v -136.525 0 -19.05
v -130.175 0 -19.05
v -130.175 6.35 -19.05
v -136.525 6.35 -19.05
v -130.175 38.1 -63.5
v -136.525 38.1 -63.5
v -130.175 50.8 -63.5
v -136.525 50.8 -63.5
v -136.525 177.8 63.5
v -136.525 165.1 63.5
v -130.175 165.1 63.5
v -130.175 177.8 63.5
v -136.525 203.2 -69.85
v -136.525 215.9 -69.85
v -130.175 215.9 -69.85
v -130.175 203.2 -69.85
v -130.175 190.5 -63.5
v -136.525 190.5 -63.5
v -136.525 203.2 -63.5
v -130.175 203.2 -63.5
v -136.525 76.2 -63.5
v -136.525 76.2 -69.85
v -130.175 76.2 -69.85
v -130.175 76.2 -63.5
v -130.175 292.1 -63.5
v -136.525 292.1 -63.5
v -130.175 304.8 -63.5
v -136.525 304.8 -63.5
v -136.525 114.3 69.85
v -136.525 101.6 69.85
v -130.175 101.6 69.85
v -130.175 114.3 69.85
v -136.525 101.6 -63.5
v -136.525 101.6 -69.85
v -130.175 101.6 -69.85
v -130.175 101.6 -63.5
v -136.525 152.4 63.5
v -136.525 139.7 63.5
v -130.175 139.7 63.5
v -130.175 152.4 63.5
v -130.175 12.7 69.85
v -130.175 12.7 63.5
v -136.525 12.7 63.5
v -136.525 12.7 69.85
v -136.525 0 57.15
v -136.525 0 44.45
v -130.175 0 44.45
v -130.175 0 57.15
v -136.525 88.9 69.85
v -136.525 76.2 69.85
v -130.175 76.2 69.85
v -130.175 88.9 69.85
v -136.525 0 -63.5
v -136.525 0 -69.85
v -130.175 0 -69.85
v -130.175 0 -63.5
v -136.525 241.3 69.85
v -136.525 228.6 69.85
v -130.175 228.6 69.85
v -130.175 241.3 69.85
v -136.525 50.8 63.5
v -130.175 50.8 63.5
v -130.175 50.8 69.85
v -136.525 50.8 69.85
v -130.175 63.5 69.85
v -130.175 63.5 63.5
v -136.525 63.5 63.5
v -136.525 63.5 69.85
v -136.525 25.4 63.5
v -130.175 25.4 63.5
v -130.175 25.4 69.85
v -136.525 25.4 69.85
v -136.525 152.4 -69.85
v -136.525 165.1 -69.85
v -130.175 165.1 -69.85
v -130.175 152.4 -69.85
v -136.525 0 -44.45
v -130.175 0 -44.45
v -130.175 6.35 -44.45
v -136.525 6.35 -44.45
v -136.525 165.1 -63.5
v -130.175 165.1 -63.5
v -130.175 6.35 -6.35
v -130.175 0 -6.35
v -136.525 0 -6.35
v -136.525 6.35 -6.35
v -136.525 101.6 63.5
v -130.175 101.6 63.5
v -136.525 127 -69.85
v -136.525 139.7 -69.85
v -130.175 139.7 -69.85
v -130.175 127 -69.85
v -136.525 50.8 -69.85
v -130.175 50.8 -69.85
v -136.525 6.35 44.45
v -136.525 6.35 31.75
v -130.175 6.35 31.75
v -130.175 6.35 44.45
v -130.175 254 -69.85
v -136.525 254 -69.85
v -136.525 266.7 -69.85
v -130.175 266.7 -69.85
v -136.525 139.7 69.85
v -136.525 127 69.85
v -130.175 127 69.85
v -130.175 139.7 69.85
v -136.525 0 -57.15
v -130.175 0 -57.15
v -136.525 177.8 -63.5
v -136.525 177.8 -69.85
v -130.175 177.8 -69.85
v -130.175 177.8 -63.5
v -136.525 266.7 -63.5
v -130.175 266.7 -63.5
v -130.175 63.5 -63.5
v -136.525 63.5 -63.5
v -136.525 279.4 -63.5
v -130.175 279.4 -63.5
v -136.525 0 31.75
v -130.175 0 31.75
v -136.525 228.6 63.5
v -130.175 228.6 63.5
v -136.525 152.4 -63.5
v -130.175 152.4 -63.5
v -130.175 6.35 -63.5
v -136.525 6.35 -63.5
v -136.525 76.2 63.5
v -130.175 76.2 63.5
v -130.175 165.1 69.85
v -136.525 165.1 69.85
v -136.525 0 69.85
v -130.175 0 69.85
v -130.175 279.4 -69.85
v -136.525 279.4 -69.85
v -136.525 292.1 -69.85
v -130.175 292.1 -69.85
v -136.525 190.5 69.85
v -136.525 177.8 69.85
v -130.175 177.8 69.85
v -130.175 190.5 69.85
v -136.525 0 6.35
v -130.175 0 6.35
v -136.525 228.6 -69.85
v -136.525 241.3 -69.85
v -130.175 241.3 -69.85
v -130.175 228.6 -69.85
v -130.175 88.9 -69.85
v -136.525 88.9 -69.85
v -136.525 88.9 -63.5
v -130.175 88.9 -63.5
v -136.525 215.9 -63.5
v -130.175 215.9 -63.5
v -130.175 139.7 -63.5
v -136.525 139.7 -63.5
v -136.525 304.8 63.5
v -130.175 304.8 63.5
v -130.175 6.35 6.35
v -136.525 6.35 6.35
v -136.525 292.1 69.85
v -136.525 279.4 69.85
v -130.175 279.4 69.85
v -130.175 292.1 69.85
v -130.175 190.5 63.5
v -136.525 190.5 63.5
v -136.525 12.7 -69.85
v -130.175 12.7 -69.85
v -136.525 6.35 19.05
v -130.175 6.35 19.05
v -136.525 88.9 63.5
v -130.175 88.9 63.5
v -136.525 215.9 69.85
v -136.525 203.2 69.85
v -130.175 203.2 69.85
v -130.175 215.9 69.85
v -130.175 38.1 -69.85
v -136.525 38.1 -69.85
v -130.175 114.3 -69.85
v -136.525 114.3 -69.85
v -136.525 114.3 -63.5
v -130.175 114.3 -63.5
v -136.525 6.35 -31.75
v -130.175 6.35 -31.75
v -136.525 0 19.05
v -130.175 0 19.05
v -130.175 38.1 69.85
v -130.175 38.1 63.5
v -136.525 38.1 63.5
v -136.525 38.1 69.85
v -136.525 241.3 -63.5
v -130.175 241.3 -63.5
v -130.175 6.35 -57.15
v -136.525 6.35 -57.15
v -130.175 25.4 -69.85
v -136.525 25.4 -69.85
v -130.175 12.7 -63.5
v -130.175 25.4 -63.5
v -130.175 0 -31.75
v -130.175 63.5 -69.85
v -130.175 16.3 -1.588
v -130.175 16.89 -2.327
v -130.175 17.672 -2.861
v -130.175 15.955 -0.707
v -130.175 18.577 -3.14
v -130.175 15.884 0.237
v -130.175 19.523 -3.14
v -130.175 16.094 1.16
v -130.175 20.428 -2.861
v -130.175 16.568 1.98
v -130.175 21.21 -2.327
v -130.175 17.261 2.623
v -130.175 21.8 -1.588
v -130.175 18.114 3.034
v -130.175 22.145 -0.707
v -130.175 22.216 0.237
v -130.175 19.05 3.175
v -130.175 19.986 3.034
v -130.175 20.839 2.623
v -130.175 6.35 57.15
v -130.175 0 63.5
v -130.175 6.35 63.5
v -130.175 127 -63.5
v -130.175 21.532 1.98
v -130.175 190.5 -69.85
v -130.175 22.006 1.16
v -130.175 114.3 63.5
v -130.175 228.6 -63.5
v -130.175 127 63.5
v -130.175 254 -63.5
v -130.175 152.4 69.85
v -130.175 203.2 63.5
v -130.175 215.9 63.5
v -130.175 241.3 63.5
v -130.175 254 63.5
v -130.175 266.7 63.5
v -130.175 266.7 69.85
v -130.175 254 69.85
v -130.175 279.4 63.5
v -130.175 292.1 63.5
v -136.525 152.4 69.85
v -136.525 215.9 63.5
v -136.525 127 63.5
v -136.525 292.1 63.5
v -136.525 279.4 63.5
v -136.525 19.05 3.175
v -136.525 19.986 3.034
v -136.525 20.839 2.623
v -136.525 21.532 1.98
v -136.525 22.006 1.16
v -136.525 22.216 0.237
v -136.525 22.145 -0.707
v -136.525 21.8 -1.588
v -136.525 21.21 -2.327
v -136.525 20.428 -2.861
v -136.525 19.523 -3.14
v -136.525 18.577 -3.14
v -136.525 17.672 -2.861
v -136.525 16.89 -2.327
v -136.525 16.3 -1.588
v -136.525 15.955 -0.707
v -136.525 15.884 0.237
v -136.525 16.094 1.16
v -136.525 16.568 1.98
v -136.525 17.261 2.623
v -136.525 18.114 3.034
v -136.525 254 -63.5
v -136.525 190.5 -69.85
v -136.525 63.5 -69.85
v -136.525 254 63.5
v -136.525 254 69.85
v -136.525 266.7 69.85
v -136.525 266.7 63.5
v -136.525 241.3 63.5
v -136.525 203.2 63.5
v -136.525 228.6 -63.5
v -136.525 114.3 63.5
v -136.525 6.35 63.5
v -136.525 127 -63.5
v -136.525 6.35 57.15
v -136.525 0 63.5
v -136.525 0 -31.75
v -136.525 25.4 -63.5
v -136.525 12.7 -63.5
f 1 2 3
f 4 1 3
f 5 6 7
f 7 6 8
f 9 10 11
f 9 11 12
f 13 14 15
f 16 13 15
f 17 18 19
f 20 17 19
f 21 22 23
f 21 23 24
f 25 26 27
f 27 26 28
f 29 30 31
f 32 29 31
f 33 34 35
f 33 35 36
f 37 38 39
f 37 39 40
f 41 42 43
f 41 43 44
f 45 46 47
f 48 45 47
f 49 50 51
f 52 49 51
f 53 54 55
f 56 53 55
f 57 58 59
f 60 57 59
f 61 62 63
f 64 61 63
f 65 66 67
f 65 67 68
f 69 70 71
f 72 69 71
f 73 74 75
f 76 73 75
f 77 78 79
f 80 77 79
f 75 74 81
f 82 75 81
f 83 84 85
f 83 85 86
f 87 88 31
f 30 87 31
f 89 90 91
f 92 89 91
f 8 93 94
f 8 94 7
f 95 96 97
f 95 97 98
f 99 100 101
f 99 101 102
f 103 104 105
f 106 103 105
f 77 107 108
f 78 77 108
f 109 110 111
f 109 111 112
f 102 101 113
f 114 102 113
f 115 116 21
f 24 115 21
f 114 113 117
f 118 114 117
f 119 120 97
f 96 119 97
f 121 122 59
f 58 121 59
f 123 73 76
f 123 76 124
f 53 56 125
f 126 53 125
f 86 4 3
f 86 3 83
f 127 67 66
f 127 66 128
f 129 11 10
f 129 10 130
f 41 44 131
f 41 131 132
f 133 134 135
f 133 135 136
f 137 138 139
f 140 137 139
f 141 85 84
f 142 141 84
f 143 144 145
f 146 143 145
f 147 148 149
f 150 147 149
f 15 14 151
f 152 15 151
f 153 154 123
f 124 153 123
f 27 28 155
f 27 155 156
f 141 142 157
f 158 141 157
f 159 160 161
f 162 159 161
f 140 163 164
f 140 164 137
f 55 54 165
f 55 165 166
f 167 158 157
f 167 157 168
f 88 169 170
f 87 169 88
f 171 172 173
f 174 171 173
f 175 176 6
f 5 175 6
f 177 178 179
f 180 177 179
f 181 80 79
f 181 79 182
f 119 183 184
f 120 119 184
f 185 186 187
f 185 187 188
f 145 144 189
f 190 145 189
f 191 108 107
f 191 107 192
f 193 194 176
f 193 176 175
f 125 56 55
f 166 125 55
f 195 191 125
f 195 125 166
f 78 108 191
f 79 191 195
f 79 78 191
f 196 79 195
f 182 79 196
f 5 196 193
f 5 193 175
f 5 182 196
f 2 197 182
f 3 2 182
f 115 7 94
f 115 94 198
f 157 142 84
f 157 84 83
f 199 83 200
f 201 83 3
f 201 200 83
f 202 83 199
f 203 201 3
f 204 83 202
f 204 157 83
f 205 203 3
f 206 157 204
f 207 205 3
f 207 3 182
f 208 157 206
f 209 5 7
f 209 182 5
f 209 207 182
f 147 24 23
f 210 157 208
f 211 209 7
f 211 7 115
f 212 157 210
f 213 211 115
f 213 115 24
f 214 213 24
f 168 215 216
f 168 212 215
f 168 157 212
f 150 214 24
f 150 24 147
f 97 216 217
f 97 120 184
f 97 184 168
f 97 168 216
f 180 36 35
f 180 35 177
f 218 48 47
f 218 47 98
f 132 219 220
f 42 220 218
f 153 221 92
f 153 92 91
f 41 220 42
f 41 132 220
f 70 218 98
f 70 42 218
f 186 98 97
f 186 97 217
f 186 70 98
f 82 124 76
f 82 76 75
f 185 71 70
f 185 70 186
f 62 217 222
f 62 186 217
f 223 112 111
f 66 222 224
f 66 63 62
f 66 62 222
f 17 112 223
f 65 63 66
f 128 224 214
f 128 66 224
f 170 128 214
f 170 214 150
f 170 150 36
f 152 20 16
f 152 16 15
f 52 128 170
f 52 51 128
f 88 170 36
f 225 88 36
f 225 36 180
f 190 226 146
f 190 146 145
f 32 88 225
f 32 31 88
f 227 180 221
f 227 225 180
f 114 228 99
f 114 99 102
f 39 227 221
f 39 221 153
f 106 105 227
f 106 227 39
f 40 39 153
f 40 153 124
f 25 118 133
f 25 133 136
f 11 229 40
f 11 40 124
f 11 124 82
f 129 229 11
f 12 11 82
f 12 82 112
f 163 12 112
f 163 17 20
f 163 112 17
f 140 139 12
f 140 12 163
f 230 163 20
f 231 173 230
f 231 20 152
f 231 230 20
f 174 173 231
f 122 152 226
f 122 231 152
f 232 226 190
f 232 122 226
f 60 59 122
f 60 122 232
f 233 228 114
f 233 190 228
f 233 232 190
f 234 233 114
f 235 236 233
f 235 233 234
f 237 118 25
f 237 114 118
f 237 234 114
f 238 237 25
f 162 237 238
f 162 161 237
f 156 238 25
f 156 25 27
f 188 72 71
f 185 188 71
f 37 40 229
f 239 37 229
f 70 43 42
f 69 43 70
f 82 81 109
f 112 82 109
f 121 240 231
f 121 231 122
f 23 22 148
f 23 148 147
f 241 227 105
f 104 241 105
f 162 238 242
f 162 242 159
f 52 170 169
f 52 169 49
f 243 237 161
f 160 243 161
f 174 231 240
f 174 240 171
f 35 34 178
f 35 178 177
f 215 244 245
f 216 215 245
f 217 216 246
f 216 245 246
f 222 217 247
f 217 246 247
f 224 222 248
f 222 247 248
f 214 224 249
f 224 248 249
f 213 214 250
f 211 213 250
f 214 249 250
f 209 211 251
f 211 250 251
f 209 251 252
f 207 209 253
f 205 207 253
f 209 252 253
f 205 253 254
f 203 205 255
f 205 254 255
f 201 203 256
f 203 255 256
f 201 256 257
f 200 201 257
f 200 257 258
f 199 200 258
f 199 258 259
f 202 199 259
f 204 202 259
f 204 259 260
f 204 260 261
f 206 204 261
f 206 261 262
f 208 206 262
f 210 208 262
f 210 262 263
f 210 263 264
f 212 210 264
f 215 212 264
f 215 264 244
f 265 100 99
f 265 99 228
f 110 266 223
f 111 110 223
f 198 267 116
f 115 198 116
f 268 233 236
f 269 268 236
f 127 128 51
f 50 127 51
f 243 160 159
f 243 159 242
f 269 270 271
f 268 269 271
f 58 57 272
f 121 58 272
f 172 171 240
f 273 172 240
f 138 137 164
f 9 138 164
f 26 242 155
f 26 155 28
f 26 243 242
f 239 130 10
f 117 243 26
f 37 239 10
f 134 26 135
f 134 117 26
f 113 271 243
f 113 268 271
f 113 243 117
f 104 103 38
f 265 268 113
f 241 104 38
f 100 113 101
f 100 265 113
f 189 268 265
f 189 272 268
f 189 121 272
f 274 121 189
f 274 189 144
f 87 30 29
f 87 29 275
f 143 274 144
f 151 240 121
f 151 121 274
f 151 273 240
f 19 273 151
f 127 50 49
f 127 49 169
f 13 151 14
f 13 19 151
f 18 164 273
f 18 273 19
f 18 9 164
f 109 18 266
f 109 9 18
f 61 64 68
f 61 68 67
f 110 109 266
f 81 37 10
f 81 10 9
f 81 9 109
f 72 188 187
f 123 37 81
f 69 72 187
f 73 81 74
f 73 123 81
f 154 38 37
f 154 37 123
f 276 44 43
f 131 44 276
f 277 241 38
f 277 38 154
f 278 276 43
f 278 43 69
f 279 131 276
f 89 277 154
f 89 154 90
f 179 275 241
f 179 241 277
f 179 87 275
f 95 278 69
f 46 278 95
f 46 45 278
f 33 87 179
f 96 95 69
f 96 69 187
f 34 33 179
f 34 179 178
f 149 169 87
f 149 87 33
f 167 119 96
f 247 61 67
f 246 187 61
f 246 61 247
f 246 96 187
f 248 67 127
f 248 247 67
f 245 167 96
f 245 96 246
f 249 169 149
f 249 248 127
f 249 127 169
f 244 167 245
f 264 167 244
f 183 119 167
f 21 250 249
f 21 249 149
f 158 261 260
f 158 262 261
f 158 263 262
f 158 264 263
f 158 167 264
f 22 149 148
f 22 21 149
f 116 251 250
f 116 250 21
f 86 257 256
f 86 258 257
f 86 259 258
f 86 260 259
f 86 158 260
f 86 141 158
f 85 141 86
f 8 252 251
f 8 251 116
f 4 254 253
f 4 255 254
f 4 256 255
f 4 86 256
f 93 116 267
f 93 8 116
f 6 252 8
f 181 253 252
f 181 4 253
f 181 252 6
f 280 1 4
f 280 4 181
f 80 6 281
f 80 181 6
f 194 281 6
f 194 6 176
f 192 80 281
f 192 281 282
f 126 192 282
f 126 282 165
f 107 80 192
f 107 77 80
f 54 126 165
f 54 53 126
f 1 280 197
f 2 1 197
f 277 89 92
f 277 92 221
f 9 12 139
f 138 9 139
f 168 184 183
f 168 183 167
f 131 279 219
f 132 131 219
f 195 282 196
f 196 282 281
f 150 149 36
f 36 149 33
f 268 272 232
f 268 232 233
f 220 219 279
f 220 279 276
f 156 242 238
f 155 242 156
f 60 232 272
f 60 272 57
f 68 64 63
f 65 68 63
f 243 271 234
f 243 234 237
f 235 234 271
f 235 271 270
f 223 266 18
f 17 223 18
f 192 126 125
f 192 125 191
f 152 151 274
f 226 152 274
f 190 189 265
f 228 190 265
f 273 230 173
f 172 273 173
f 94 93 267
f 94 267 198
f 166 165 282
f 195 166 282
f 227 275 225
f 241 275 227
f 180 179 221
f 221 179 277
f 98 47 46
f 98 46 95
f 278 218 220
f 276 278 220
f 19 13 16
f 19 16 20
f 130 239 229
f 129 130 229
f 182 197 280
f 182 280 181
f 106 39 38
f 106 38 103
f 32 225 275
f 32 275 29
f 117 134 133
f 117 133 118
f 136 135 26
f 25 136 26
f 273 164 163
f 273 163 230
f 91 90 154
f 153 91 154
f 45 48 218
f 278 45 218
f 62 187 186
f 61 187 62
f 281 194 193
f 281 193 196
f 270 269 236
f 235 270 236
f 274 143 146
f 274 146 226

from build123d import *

# Parameters (mm, degrees)
SKETCH1_W              = 273.05
SKETCH1_H              = 139.7
BOSS_EXTRUDE1_DEPTH    = 6.35
SKETCH2_W              = 273.05
SKETCH2_H              = 139.7
SKETCH2_W_2            = 260.35
SKETCH2_H_2            = 127
BOSS_EXTRUDE2_DEPTH    = 298.45
SKETCH3_W              = 6.35
SKETCH3_H              = 16.933333333
SKETCH3_H_2            = 16.933333334
DOOR_SLOT_DEPTH        = 12.7
DOOR_GUIDE_HOLES_REACH = 361.617
SKETCH4_W              = 6.35
SKETCH4_H              = 15.875
LEVER_HOLES_W          = 9.652
LEVER_HOLES_H          = 6.35
LEVER_HOLES_W_2        = 6.35
CUT_EXTRUDE1_DEPTH     = 363.019620497
CUT_EXTRUDE2_REACH     = 417.137
SKETCH7_R              = 26.9875
CUT_EXTRUDE3_REACH     = 417.137
SKETCH8_R              = 3.175
SKETCH16_W             = 336.131526087
SKETCH16_H             = 315.233565403
CUT_EXTRUDE10_DEPTH    = 363.019620497
LEFT_RIGHT_W           = 6.35
LEFT_RIGHT_H           = 6.35
LEFT_RIGHT_W_2         = 12.7
LEFT_RIGHT_H_2         = 12.7
CUT_EXTRUDE11_DEPTH    = 313.765703043


with BuildPart() as part:
    # Sketch1 → Boss-Extrude1 (new body)
    with BuildSketch(Plane(origin=(0, 0, 0), x_dir=(1, 0, 0), z_dir=(0, 1, 0))):
        Rectangle(SKETCH1_W, SKETCH1_H)
    extrude(amount=BOSS_EXTRUDE1_DEPTH)

    # Sketch2 → Boss-Extrude2 (add)
    with BuildSketch(Plane(origin=(0, 6.35, 0), x_dir=(1, 0, 0), z_dir=(0, 1, 0))):
        Rectangle(SKETCH2_W, SKETCH2_H)
        Rectangle(SKETCH2_W_2, SKETCH2_H_2, mode=Mode.SUBTRACT)
    extrude(amount=BOSS_EXTRUDE2_DEPTH)

    # Sketch3 → Door Slot (cut)
    with BuildSketch(Plane.XY.offset(69.85)):
        with BuildLine():
            Line((-28.575, 283.21), (-28.575, 6.35))
            Line((-28.575, 6.35), (-21.971, 6.35))
            Line((-21.971, 6.35), (-21.971, 292.354))
            Line((-21.971, 292.354), (-41.529, 292.354))
            Line((-41.529, 292.354), (-41.529, 285.75))
            Line((-41.529, 285.75), (-31.115, 285.75))
            ThreePointArc((-31.115, 285.75), (-29.318948776, 285.006051224), (-28.575, 283.21))
        make_face()
        with Locations((-12.446, 80.433333334)):
            Rectangle(SKETCH3_W, SKETCH3_H)
        with Locations((-12.446, 50.8)):
            Rectangle(SKETCH3_W, SKETCH3_H_2)
        with Locations((-12.446, 21.166666667)):
            Rectangle(SKETCH3_W, SKETCH3_H)
    extrude(amount=-DOOR_SLOT_DEPTH, mode=Mode.SUBTRACT)

    # Sketch4 → Door Guide Holes (cut, up to next)
    with BuildSketch(Plane.XY.offset(-63.5), mode=Mode.PRIVATE) as door_guide_holes_sk1:
        with Locations((-44.704, 284.1625)):
            Rectangle(SKETCH4_W, SKETCH4_H)
    door_guide_holes_tool1 = extrude(door_guide_holes_sk1.sketch, amount=-DOOR_GUIDE_HOLES_REACH, mode=Mode.PRIVATE) & part.part
    # Sketch4 → Door Guide Holes (cut, up to next)
    with BuildSketch(Plane.XY.offset(-63.5), mode=Mode.PRIVATE) as door_guide_holes_sk2:
        with Locations((-44.704, 255.5875)):
            Rectangle(SKETCH4_W, SKETCH4_H)
    door_guide_holes_tool2 = extrude(door_guide_holes_sk2.sketch, amount=-DOOR_GUIDE_HOLES_REACH, mode=Mode.PRIVATE) & part.part
    # Sketch4 → Door Guide Holes (cut, up to next)
    with BuildSketch(Plane.XY.offset(-63.5), mode=Mode.PRIVATE) as door_guide_holes_sk3:
        with Locations((-44.704, 227.0125)):
            Rectangle(SKETCH4_W, SKETCH4_H)
    door_guide_holes_tool3 = extrude(door_guide_holes_sk3.sketch, amount=-DOOR_GUIDE_HOLES_REACH, mode=Mode.PRIVATE) & part.part
    # Sketch4 → Door Guide Holes (cut, up to next)
    with BuildSketch(Plane.XY.offset(-63.5), mode=Mode.PRIVATE) as door_guide_holes_sk4:
        with Locations((-44.704, 198.4375)):
            Rectangle(SKETCH4_W, SKETCH4_H)
    door_guide_holes_tool4 = extrude(door_guide_holes_sk4.sketch, amount=-DOOR_GUIDE_HOLES_REACH, mode=Mode.PRIVATE) & part.part
    # Sketch4 → Door Guide Holes (cut, up to next)
    with BuildSketch(Plane.XY.offset(-63.5), mode=Mode.PRIVATE) as door_guide_holes_sk5:
        with Locations((-44.704, 169.8625)):
            Rectangle(SKETCH4_W, SKETCH4_H)
    door_guide_holes_tool5 = extrude(door_guide_holes_sk5.sketch, amount=-DOOR_GUIDE_HOLES_REACH, mode=Mode.PRIVATE) & part.part
    # Sketch4 → Door Guide Holes (cut, up to next)
    with BuildSketch(Plane.XY.offset(-63.5), mode=Mode.PRIVATE) as door_guide_holes_sk6:
        with Locations((-44.704, 141.2875)):
            Rectangle(SKETCH4_W, SKETCH4_H)
    door_guide_holes_tool6 = extrude(door_guide_holes_sk6.sketch, amount=-DOOR_GUIDE_HOLES_REACH, mode=Mode.PRIVATE) & part.part
    # Sketch4 → Door Guide Holes (cut, up to next)
    with BuildSketch(Plane.XY.offset(-63.5), mode=Mode.PRIVATE) as door_guide_holes_sk7:
        with Locations((-44.704, 112.7125)):
            Rectangle(SKETCH4_W, SKETCH4_H)
    door_guide_holes_tool7 = extrude(door_guide_holes_sk7.sketch, amount=-DOOR_GUIDE_HOLES_REACH, mode=Mode.PRIVATE) & part.part
    # Sketch4 → Door Guide Holes (cut, up to next)
    with BuildSketch(Plane.XY.offset(-63.5), mode=Mode.PRIVATE) as door_guide_holes_sk8:
        with Locations((-44.704, 84.1375)):
            Rectangle(SKETCH4_W, SKETCH4_H)
    door_guide_holes_tool8 = extrude(door_guide_holes_sk8.sketch, amount=-DOOR_GUIDE_HOLES_REACH, mode=Mode.PRIVATE) & part.part
    # Sketch4 → Door Guide Holes (cut, up to next)
    with BuildSketch(Plane.XY.offset(-63.5), mode=Mode.PRIVATE) as door_guide_holes_sk9:
        with Locations((-44.704, 55.5625)):
            Rectangle(SKETCH4_W, SKETCH4_H)
    door_guide_holes_tool9 = extrude(door_guide_holes_sk9.sketch, amount=-DOOR_GUIDE_HOLES_REACH, mode=Mode.PRIVATE) & part.part
    # Sketch4 → Door Guide Holes (cut, up to next)
    with BuildSketch(Plane.XY.offset(-63.5), mode=Mode.PRIVATE) as door_guide_holes_sk10:
        with Locations((-44.704, 26.9875)):
            Rectangle(SKETCH4_W, SKETCH4_H)
    door_guide_holes_tool10 = extrude(door_guide_holes_sk10.sketch, amount=-DOOR_GUIDE_HOLES_REACH, mode=Mode.PRIVATE) & part.part
    door_guide_holes_1 = door_guide_holes_tool1.solids().sort_by_distance((-44.704, 284.1625, -63.5))[0]
    add(door_guide_holes_1, mode=Mode.SUBTRACT)
    door_guide_holes_2 = door_guide_holes_tool2.solids().sort_by_distance((-44.704, 255.5875, -63.5))[0]
    add(door_guide_holes_2, mode=Mode.SUBTRACT)
    door_guide_holes_3 = door_guide_holes_tool3.solids().sort_by_distance((-44.704, 227.0125, -63.5))[0]
    add(door_guide_holes_3, mode=Mode.SUBTRACT)
    door_guide_holes_4 = door_guide_holes_tool4.solids().sort_by_distance((-44.704, 198.4375, -63.5))[0]
    add(door_guide_holes_4, mode=Mode.SUBTRACT)
    door_guide_holes_5 = door_guide_holes_tool5.solids().sort_by_distance((-44.704, 169.8625, -63.5))[0]
    add(door_guide_holes_5, mode=Mode.SUBTRACT)
    door_guide_holes_6 = door_guide_holes_tool6.solids().sort_by_distance((-44.704, 141.2875, -63.5))[0]
    add(door_guide_holes_6, mode=Mode.SUBTRACT)
    door_guide_holes_7 = door_guide_holes_tool7.solids().sort_by_distance((-44.704, 112.7125, -63.5))[0]
    add(door_guide_holes_7, mode=Mode.SUBTRACT)
    door_guide_holes_8 = door_guide_holes_tool8.solids().sort_by_distance((-44.704, 84.1375, -63.5))[0]
    add(door_guide_holes_8, mode=Mode.SUBTRACT)
    door_guide_holes_9 = door_guide_holes_tool9.solids().sort_by_distance((-44.704, 55.5625, -63.5))[0]
    add(door_guide_holes_9, mode=Mode.SUBTRACT)
    door_guide_holes_10 = door_guide_holes_tool10.solids().sort_by_distance((-44.704, 26.9875, -63.5))[0]
    add(door_guide_holes_10, mode=Mode.SUBTRACT)
    door_guide_holes = door_guide_holes_1 + door_guide_holes_2 + door_guide_holes_3 + door_guide_holes_4 + door_guide_holes_5 + door_guide_holes_6 + door_guide_holes_7 + door_guide_holes_8 + door_guide_holes_9 + door_guide_holes_10  # Door Guide Holes as one shape, for the pattern or mirror that repeats it

    # Mirror1: Door Guide Holes across plane
    add(door_guide_holes.mirror(Plane.ZY.offset(31.75)), mode=Mode.SUBTRACT)

    # Lever Holes → Cut-Extrude1 (cut, through all)
    with BuildSketch(Plane.XY.offset(69.85)):
        with Locations((54.102, 28.575)):
            Rectangle(LEVER_HOLES_W, LEVER_HOLES_H)
        with Locations((39.3065, 15.875)):
            Rectangle(LEVER_HOLES_W_2, LEVER_HOLES_H)
        with Locations((68.8975, 15.875)):
            Rectangle(LEVER_HOLES_W_2, LEVER_HOLES_H)
    extrude(amount=-CUT_EXTRUDE1_DEPTH, mode=Mode.SUBTRACT)

    # Sketch7 → Cut-Extrude2 (cut, up to next)
    with BuildSketch(Plane(origin=(136.525, 0, 0), x_dir=(0, 0, -1), z_dir=(1, 0, 0)), mode=Mode.PRIVATE) as cut_extrude2_sk1:
        with Locations((0, 55.372)):
            Circle(SKETCH7_R)
    cut_extrude2_tool1 = extrude(cut_extrude2_sk1.sketch, amount=-CUT_EXTRUDE2_REACH, mode=Mode.PRIVATE) & part.part
    # Sketch7 → Cut-Extrude2 (cut, up to next)
    with BuildSketch(Plane(origin=(136.525, 0, 0), x_dir=(0, 0, -1), z_dir=(1, 0, 0)), mode=Mode.PRIVATE) as cut_extrude2_sk2:
        with BuildLine():
            Line((-37.211, 89.408), (-37.211, 92.583))
            Line((-37.211, 92.583), (-34.036, 92.583))
            ThreePointArc((-34.036, 92.583), (-39.45606403, 94.82806403), (-37.211, 89.408))
        make_face()
    cut_extrude2_tool2 = extrude(cut_extrude2_sk2.sketch, amount=-CUT_EXTRUDE2_REACH, mode=Mode.PRIVATE) & part.part
    # Sketch7 → Cut-Extrude2 (cut, up to next)
    with BuildSketch(Plane(origin=(136.525, 0, 0), x_dir=(0, 0, -1), z_dir=(1, 0, 0)), mode=Mode.PRIVATE) as cut_extrude2_sk3:
        with BuildLine():
            Line((-34.036, 92.583), (-37.211, 92.583))
            Line((-37.211, 92.583), (-37.211, 89.408))
            ThreePointArc((-37.211, 89.408), (-34.96593597, 90.33793597), (-34.036, 92.583))
        make_face()
    cut_extrude2_tool3 = extrude(cut_extrude2_sk3.sketch, amount=-CUT_EXTRUDE2_REACH, mode=Mode.PRIVATE) & part.part
    # Sketch7 → Cut-Extrude2 (cut, up to next)
    with BuildSketch(Plane(origin=(136.525, 0, 0), x_dir=(0, 0, -1), z_dir=(1, 0, 0)), mode=Mode.PRIVATE) as cut_extrude2_sk4:
        with BuildLine():
            Line((-37.211, 89.408), (-37.211, 92.583))
            Line((-37.211, 92.583), (-34.036, 92.583))
            ThreePointArc((-34.036, 92.583), (-39.45606403, 94.82806403), (-37.211, 89.408))
        make_face()
    cut_extrude2_tool4 = extrude(cut_extrude2_sk4.sketch, amount=-CUT_EXTRUDE2_REACH, mode=Mode.PRIVATE) & part.part
    # Sketch7 → Cut-Extrude2 (cut, up to next)
    with BuildSketch(Plane(origin=(136.525, 0, 0), x_dir=(0, 0, -1), z_dir=(1, 0, 0)), mode=Mode.PRIVATE) as cut_extrude2_sk5:
        with BuildLine():
            Line((-34.036, 92.583), (-37.211, 92.583))
            Line((-37.211, 92.583), (-37.211, 89.408))
            ThreePointArc((-37.211, 89.408), (-34.96593597, 90.33793597), (-34.036, 92.583))
        make_face()
    cut_extrude2_tool5 = extrude(cut_extrude2_sk5.sketch, amount=-CUT_EXTRUDE2_REACH, mode=Mode.PRIVATE) & part.part
    # Sketch7 → Cut-Extrude2 (cut, up to next)
    with BuildSketch(Plane(origin=(136.525, 0, 0), x_dir=(0, 0, -1), z_dir=(1, 0, 0)), mode=Mode.PRIVATE) as cut_extrude2_sk6:
        with BuildLine():
            ThreePointArc((40.386, 92.583), (37.211, 95.758), (34.036, 92.583))
            Line((34.036, 92.583), (37.211, 92.583))
            Line((37.211, 92.583), (37.211, 89.408))
            ThreePointArc((37.211, 89.408), (39.45606403, 90.33793597), (40.386, 92.583))
        make_face()
    cut_extrude2_tool6 = extrude(cut_extrude2_sk6.sketch, amount=-CUT_EXTRUDE2_REACH, mode=Mode.PRIVATE) & part.part
    # Sketch7 → Cut-Extrude2 (cut, up to next)
    with BuildSketch(Plane(origin=(136.525, 0, 0), x_dir=(0, 0, -1), z_dir=(1, 0, 0)), mode=Mode.PRIVATE) as cut_extrude2_sk7:
        with BuildLine():
            Line((37.211, 92.583), (34.036, 92.583))
            ThreePointArc((34.036, 92.583), (34.96593597, 90.33793597), (37.211, 89.408))
            Line((37.211, 89.408), (37.211, 92.583))
        make_face()
    cut_extrude2_tool7 = extrude(cut_extrude2_sk7.sketch, amount=-CUT_EXTRUDE2_REACH, mode=Mode.PRIVATE) & part.part
    # Sketch7 → Cut-Extrude2 (cut, up to next)
    with BuildSketch(Plane(origin=(136.525, 0, 0), x_dir=(0, 0, -1), z_dir=(1, 0, 0)), mode=Mode.PRIVATE) as cut_extrude2_sk8:
        with BuildLine():
            ThreePointArc((40.386, 92.583), (37.211, 95.758), (34.036, 92.583))
            Line((34.036, 92.583), (37.211, 92.583))
            Line((37.211, 92.583), (37.211, 89.408))
            ThreePointArc((37.211, 89.408), (39.45606403, 90.33793597), (40.386, 92.583))
        make_face()
    cut_extrude2_tool8 = extrude(cut_extrude2_sk8.sketch, amount=-CUT_EXTRUDE2_REACH, mode=Mode.PRIVATE) & part.part
    # Sketch7 → Cut-Extrude2 (cut, up to next)
    with BuildSketch(Plane(origin=(136.525, 0, 0), x_dir=(0, 0, -1), z_dir=(1, 0, 0)), mode=Mode.PRIVATE) as cut_extrude2_sk9:
        with BuildLine():
            Line((37.211, 92.583), (34.036, 92.583))
            ThreePointArc((34.036, 92.583), (34.96593597, 90.33793597), (37.211, 89.408))
            Line((37.211, 89.408), (37.211, 92.583))
        make_face()
    cut_extrude2_tool9 = extrude(cut_extrude2_sk9.sketch, amount=-CUT_EXTRUDE2_REACH, mode=Mode.PRIVATE) & part.part
    # Sketch7 → Cut-Extrude2 (cut, up to next)
    with BuildSketch(Plane(origin=(136.525, 0, 0), x_dir=(0, 0, -1), z_dir=(1, 0, 0)), mode=Mode.PRIVATE) as cut_extrude2_sk10:
        with BuildLine():
            ThreePointArc((-34.036, 18.161), (-34.96593597, 20.40606403), (-37.211, 21.336))
            Line((-37.211, 21.336), (-37.211, 18.161))
            Line((-37.211, 18.161), (-34.036, 18.161))
        make_face()
    cut_extrude2_tool10 = extrude(cut_extrude2_sk10.sketch, amount=-CUT_EXTRUDE2_REACH, mode=Mode.PRIVATE) & part.part
    # Sketch7 → Cut-Extrude2 (cut, up to next)
    with BuildSketch(Plane(origin=(136.525, 0, 0), x_dir=(0, 0, -1), z_dir=(1, 0, 0)), mode=Mode.PRIVATE) as cut_extrude2_sk11:
        with BuildLine():
            Line((-37.211, 18.161), (-37.211, 21.336))
            ThreePointArc((-37.211, 21.336), (-39.45606403, 15.91593597), (-34.036, 18.161))
            Line((-34.036, 18.161), (-37.211, 18.161))
        make_face()
    cut_extrude2_tool11 = extrude(cut_extrude2_sk11.sketch, amount=-CUT_EXTRUDE2_REACH, mode=Mode.PRIVATE) & part.part
    # Sketch7 → Cut-Extrude2 (cut, up to next)
    with BuildSketch(Plane(origin=(136.525, 0, 0), x_dir=(0, 0, -1), z_dir=(1, 0, 0)), mode=Mode.PRIVATE) as cut_extrude2_sk12:
        with BuildLine():
            ThreePointArc((-34.036, 18.161), (-34.96593597, 20.40606403), (-37.211, 21.336))
            Line((-37.211, 21.336), (-37.211, 18.161))
            Line((-37.211, 18.161), (-34.036, 18.161))
        make_face()
    cut_extrude2_tool12 = extrude(cut_extrude2_sk12.sketch, amount=-CUT_EXTRUDE2_REACH, mode=Mode.PRIVATE) & part.part
    # Sketch7 → Cut-Extrude2 (cut, up to next)
    with BuildSketch(Plane(origin=(136.525, 0, 0), x_dir=(0, 0, -1), z_dir=(1, 0, 0)), mode=Mode.PRIVATE) as cut_extrude2_sk13:
        with BuildLine():
            Line((-37.211, 18.161), (-37.211, 21.336))
            ThreePointArc((-37.211, 21.336), (-39.45606403, 15.91593597), (-34.036, 18.161))
            Line((-34.036, 18.161), (-37.211, 18.161))
        make_face()
    cut_extrude2_tool13 = extrude(cut_extrude2_sk13.sketch, amount=-CUT_EXTRUDE2_REACH, mode=Mode.PRIVATE) & part.part
    # Sketch7 → Cut-Extrude2 (cut, up to next)
    with BuildSketch(Plane(origin=(136.525, 0, 0), x_dir=(0, 0, -1), z_dir=(1, 0, 0)), mode=Mode.PRIVATE) as cut_extrude2_sk14:
        with BuildLine():
            ThreePointArc((40.386, 18.161), (39.45606403, 20.40606403), (37.211, 21.336))
            Line((37.211, 21.336), (37.211, 18.161))
            Line((37.211, 18.161), (34.036, 18.161))
            ThreePointArc((34.036, 18.161), (37.211, 14.986), (40.386, 18.161))
        make_face()
    cut_extrude2_tool14 = extrude(cut_extrude2_sk14.sketch, amount=-CUT_EXTRUDE2_REACH, mode=Mode.PRIVATE) & part.part
    # Sketch7 → Cut-Extrude2 (cut, up to next)
    with BuildSketch(Plane(origin=(136.525, 0, 0), x_dir=(0, 0, -1), z_dir=(1, 0, 0)), mode=Mode.PRIVATE) as cut_extrude2_sk15:
        with BuildLine():
            Line((37.211, 18.161), (37.211, 21.336))
            ThreePointArc((37.211, 21.336), (34.96593597, 20.40606403), (34.036, 18.161))
            Line((34.036, 18.161), (37.211, 18.161))
        make_face()
    cut_extrude2_tool15 = extrude(cut_extrude2_sk15.sketch, amount=-CUT_EXTRUDE2_REACH, mode=Mode.PRIVATE) & part.part
    # Sketch7 → Cut-Extrude2 (cut, up to next)
    with BuildSketch(Plane(origin=(136.525, 0, 0), x_dir=(0, 0, -1), z_dir=(1, 0, 0)), mode=Mode.PRIVATE) as cut_extrude2_sk16:
        with BuildLine():
            ThreePointArc((40.386, 18.161), (39.45606403, 20.40606403), (37.211, 21.336))
            Line((37.211, 21.336), (37.211, 18.161))
            Line((37.211, 18.161), (34.036, 18.161))
            ThreePointArc((34.036, 18.161), (37.211, 14.986), (40.386, 18.161))
        make_face()
    cut_extrude2_tool16 = extrude(cut_extrude2_sk16.sketch, amount=-CUT_EXTRUDE2_REACH, mode=Mode.PRIVATE) & part.part
    # Sketch7 → Cut-Extrude2 (cut, up to next)
    with BuildSketch(Plane(origin=(136.525, 0, 0), x_dir=(0, 0, -1), z_dir=(1, 0, 0)), mode=Mode.PRIVATE) as cut_extrude2_sk17:
        with BuildLine():
            Line((37.211, 18.161), (37.211, 21.336))
            ThreePointArc((37.211, 21.336), (34.96593597, 20.40606403), (34.036, 18.161))
            Line((34.036, 18.161), (37.211, 18.161))
        make_face()
    cut_extrude2_tool17 = extrude(cut_extrude2_sk17.sketch, amount=-CUT_EXTRUDE2_REACH, mode=Mode.PRIVATE) & part.part
    add(cut_extrude2_tool1.solids().sort_by_distance((136.525, 55.372, 0))[0], mode=Mode.SUBTRACT)
    add(cut_extrude2_tool2.solids().sort_by_distance((136.525, 93.032171, 37.660171))[0], mode=Mode.SUBTRACT)
    add(cut_extrude2_tool3.solids().sort_by_distance((136.525, 91.235488, 35.863488))[0], mode=Mode.SUBTRACT)
    add(cut_extrude2_tool4.solids().sort_by_distance((136.525, 93.032171, 37.660171))[0], mode=Mode.SUBTRACT)
    add(cut_extrude2_tool5.solids().sort_by_distance((136.525, 91.235488, 35.863488))[0], mode=Mode.SUBTRACT)
    add(cut_extrude2_tool6.solids().sort_by_distance((136.525, 93.032171, -37.660171))[0], mode=Mode.SUBTRACT)
    add(cut_extrude2_tool7.solids().sort_by_distance((136.525, 91.235488, -35.863488))[0], mode=Mode.SUBTRACT)
    add(cut_extrude2_tool8.solids().sort_by_distance((136.525, 93.032171, -37.660171))[0], mode=Mode.SUBTRACT)
    add(cut_extrude2_tool9.solids().sort_by_distance((136.525, 91.235488, -35.863488))[0], mode=Mode.SUBTRACT)
    add(cut_extrude2_tool10.solids().sort_by_distance((136.525, 19.508512, 35.863488))[0], mode=Mode.SUBTRACT)
    add(cut_extrude2_tool11.solids().sort_by_distance((136.525, 17.711829, 37.660171))[0], mode=Mode.SUBTRACT)
    add(cut_extrude2_tool12.solids().sort_by_distance((136.525, 19.508512, 35.863488))[0], mode=Mode.SUBTRACT)
    add(cut_extrude2_tool13.solids().sort_by_distance((136.525, 17.711829, 37.660171))[0], mode=Mode.SUBTRACT)
    add(cut_extrude2_tool14.solids().sort_by_distance((136.525, 17.711829, -37.660171))[0], mode=Mode.SUBTRACT)
    add(cut_extrude2_tool15.solids().sort_by_distance((136.525, 19.508512, -35.863488))[0], mode=Mode.SUBTRACT)
    add(cut_extrude2_tool16.solids().sort_by_distance((136.525, 17.711829, -37.660171))[0], mode=Mode.SUBTRACT)
    add(cut_extrude2_tool17.solids().sort_by_distance((136.525, 19.508512, -35.863488))[0], mode=Mode.SUBTRACT)

    # Sketch8 → Cut-Extrude3 (cut, up to next)
    with BuildSketch(Plane.ZY.offset(136.525), mode=Mode.PRIVATE) as cut_extrude3_sk1:
        with Locations((0, 19.05)):
            Circle(SKETCH8_R)
    cut_extrude3_tool1 = extrude(cut_extrude3_sk1.sketch, amount=-CUT_EXTRUDE3_REACH, mode=Mode.PRIVATE) & part.part
    add(cut_extrude3_tool1.solids().sort_by_distance((-136.525, 19.05, 0))[0], mode=Mode.SUBTRACT)

    # Sketch16 → Cut-Extrude10 (cut, through all)
    with BuildSketch(Plane.XY.offset(69.85)):
        with Locations((37.890763044, 147.183217299)):
            Rectangle(SKETCH16_W, SKETCH16_H)
    extrude(amount=-CUT_EXTRUDE10_DEPTH, mode=Mode.SUBTRACT)

    # Left/Right → Cut-Extrude11 (cut, through all)
    with BuildSketch(Plane.ZY.offset(136.525)):
        with Locations((60.325, 3.175)):
            Rectangle(LEFT_RIGHT_W, LEFT_RIGHT_H)
        with Locations((38.1, 3.175)):
            Rectangle(LEFT_RIGHT_W_2, LEFT_RIGHT_H)
        with Locations((66.675, 19.05)):
            Rectangle(LEFT_RIGHT_W, LEFT_RIGHT_H_2)
        with Locations((12.7, 3.175)):
            Rectangle(LEFT_RIGHT_W_2, LEFT_RIGHT_H)
        with Locations((66.675, 44.45)):
            Rectangle(LEFT_RIGHT_W, LEFT_RIGHT_H_2)
        with Locations((-12.7, 3.175)):
            Rectangle(LEFT_RIGHT_W_2, LEFT_RIGHT_H)
        with Locations((66.675, 69.85)):
            Rectangle(LEFT_RIGHT_W, LEFT_RIGHT_H_2)
        with Locations((-38.1, 3.175)):
            Rectangle(LEFT_RIGHT_W_2, LEFT_RIGHT_H)
        with Locations((66.675, 95.25)):
            Rectangle(LEFT_RIGHT_W, LEFT_RIGHT_H_2)
        with Locations((-60.325, 3.175)):
            Rectangle(LEFT_RIGHT_W, LEFT_RIGHT_H)
        with Locations((66.675, 120.65)):
            Rectangle(LEFT_RIGHT_W, LEFT_RIGHT_H_2)
        with Locations((-66.675, 19.05)):
            Rectangle(LEFT_RIGHT_W, LEFT_RIGHT_H_2)
        with Locations((66.675, 146.05)):
            Rectangle(LEFT_RIGHT_W, LEFT_RIGHT_H_2)
        with Locations((-66.675, 44.45)):
            Rectangle(LEFT_RIGHT_W, LEFT_RIGHT_H_2)
        with Locations((66.675, 171.45)):
            Rectangle(LEFT_RIGHT_W, LEFT_RIGHT_H_2)
        with Locations((-66.675, 69.85)):
            Rectangle(LEFT_RIGHT_W, LEFT_RIGHT_H_2)
        with Locations((66.675, 196.85)):
            Rectangle(LEFT_RIGHT_W, LEFT_RIGHT_H_2)
        with Locations((-66.675, 95.25)):
            Rectangle(LEFT_RIGHT_W, LEFT_RIGHT_H_2)
        with Locations((66.675, 222.25)):
            Rectangle(LEFT_RIGHT_W, LEFT_RIGHT_H_2)
        with Locations((-66.675, 120.65)):
            Rectangle(LEFT_RIGHT_W, LEFT_RIGHT_H_2)
        with Locations((66.675, 247.65)):
            Rectangle(LEFT_RIGHT_W, LEFT_RIGHT_H_2)
        with Locations((-66.675, 146.05)):
            Rectangle(LEFT_RIGHT_W, LEFT_RIGHT_H_2)
        with Locations((66.675, 273.05)):
            Rectangle(LEFT_RIGHT_W, LEFT_RIGHT_H_2)
        with Locations((-66.675, 171.45)):
            Rectangle(LEFT_RIGHT_W, LEFT_RIGHT_H_2)
        with Locations((66.675, 298.45)):
            Rectangle(LEFT_RIGHT_W, LEFT_RIGHT_H_2)
        with Locations((-66.675, 196.85)):
            Rectangle(LEFT_RIGHT_W, LEFT_RIGHT_H_2)
        with Locations((-66.675, 222.25)):
            Rectangle(LEFT_RIGHT_W, LEFT_RIGHT_H_2)
        with Locations((-66.675, 247.65)):
            Rectangle(LEFT_RIGHT_W, LEFT_RIGHT_H_2)
        with Locations((-66.675, 273.05)):
            Rectangle(LEFT_RIGHT_W, LEFT_RIGHT_H_2)
        with Locations((-66.675, 298.45)):
            Rectangle(LEFT_RIGHT_W, LEFT_RIGHT_H_2)
    extrude(amount=-CUT_EXTRUDE11_DEPTH, mode=Mode.SUBTRACT)


solid = part.part
